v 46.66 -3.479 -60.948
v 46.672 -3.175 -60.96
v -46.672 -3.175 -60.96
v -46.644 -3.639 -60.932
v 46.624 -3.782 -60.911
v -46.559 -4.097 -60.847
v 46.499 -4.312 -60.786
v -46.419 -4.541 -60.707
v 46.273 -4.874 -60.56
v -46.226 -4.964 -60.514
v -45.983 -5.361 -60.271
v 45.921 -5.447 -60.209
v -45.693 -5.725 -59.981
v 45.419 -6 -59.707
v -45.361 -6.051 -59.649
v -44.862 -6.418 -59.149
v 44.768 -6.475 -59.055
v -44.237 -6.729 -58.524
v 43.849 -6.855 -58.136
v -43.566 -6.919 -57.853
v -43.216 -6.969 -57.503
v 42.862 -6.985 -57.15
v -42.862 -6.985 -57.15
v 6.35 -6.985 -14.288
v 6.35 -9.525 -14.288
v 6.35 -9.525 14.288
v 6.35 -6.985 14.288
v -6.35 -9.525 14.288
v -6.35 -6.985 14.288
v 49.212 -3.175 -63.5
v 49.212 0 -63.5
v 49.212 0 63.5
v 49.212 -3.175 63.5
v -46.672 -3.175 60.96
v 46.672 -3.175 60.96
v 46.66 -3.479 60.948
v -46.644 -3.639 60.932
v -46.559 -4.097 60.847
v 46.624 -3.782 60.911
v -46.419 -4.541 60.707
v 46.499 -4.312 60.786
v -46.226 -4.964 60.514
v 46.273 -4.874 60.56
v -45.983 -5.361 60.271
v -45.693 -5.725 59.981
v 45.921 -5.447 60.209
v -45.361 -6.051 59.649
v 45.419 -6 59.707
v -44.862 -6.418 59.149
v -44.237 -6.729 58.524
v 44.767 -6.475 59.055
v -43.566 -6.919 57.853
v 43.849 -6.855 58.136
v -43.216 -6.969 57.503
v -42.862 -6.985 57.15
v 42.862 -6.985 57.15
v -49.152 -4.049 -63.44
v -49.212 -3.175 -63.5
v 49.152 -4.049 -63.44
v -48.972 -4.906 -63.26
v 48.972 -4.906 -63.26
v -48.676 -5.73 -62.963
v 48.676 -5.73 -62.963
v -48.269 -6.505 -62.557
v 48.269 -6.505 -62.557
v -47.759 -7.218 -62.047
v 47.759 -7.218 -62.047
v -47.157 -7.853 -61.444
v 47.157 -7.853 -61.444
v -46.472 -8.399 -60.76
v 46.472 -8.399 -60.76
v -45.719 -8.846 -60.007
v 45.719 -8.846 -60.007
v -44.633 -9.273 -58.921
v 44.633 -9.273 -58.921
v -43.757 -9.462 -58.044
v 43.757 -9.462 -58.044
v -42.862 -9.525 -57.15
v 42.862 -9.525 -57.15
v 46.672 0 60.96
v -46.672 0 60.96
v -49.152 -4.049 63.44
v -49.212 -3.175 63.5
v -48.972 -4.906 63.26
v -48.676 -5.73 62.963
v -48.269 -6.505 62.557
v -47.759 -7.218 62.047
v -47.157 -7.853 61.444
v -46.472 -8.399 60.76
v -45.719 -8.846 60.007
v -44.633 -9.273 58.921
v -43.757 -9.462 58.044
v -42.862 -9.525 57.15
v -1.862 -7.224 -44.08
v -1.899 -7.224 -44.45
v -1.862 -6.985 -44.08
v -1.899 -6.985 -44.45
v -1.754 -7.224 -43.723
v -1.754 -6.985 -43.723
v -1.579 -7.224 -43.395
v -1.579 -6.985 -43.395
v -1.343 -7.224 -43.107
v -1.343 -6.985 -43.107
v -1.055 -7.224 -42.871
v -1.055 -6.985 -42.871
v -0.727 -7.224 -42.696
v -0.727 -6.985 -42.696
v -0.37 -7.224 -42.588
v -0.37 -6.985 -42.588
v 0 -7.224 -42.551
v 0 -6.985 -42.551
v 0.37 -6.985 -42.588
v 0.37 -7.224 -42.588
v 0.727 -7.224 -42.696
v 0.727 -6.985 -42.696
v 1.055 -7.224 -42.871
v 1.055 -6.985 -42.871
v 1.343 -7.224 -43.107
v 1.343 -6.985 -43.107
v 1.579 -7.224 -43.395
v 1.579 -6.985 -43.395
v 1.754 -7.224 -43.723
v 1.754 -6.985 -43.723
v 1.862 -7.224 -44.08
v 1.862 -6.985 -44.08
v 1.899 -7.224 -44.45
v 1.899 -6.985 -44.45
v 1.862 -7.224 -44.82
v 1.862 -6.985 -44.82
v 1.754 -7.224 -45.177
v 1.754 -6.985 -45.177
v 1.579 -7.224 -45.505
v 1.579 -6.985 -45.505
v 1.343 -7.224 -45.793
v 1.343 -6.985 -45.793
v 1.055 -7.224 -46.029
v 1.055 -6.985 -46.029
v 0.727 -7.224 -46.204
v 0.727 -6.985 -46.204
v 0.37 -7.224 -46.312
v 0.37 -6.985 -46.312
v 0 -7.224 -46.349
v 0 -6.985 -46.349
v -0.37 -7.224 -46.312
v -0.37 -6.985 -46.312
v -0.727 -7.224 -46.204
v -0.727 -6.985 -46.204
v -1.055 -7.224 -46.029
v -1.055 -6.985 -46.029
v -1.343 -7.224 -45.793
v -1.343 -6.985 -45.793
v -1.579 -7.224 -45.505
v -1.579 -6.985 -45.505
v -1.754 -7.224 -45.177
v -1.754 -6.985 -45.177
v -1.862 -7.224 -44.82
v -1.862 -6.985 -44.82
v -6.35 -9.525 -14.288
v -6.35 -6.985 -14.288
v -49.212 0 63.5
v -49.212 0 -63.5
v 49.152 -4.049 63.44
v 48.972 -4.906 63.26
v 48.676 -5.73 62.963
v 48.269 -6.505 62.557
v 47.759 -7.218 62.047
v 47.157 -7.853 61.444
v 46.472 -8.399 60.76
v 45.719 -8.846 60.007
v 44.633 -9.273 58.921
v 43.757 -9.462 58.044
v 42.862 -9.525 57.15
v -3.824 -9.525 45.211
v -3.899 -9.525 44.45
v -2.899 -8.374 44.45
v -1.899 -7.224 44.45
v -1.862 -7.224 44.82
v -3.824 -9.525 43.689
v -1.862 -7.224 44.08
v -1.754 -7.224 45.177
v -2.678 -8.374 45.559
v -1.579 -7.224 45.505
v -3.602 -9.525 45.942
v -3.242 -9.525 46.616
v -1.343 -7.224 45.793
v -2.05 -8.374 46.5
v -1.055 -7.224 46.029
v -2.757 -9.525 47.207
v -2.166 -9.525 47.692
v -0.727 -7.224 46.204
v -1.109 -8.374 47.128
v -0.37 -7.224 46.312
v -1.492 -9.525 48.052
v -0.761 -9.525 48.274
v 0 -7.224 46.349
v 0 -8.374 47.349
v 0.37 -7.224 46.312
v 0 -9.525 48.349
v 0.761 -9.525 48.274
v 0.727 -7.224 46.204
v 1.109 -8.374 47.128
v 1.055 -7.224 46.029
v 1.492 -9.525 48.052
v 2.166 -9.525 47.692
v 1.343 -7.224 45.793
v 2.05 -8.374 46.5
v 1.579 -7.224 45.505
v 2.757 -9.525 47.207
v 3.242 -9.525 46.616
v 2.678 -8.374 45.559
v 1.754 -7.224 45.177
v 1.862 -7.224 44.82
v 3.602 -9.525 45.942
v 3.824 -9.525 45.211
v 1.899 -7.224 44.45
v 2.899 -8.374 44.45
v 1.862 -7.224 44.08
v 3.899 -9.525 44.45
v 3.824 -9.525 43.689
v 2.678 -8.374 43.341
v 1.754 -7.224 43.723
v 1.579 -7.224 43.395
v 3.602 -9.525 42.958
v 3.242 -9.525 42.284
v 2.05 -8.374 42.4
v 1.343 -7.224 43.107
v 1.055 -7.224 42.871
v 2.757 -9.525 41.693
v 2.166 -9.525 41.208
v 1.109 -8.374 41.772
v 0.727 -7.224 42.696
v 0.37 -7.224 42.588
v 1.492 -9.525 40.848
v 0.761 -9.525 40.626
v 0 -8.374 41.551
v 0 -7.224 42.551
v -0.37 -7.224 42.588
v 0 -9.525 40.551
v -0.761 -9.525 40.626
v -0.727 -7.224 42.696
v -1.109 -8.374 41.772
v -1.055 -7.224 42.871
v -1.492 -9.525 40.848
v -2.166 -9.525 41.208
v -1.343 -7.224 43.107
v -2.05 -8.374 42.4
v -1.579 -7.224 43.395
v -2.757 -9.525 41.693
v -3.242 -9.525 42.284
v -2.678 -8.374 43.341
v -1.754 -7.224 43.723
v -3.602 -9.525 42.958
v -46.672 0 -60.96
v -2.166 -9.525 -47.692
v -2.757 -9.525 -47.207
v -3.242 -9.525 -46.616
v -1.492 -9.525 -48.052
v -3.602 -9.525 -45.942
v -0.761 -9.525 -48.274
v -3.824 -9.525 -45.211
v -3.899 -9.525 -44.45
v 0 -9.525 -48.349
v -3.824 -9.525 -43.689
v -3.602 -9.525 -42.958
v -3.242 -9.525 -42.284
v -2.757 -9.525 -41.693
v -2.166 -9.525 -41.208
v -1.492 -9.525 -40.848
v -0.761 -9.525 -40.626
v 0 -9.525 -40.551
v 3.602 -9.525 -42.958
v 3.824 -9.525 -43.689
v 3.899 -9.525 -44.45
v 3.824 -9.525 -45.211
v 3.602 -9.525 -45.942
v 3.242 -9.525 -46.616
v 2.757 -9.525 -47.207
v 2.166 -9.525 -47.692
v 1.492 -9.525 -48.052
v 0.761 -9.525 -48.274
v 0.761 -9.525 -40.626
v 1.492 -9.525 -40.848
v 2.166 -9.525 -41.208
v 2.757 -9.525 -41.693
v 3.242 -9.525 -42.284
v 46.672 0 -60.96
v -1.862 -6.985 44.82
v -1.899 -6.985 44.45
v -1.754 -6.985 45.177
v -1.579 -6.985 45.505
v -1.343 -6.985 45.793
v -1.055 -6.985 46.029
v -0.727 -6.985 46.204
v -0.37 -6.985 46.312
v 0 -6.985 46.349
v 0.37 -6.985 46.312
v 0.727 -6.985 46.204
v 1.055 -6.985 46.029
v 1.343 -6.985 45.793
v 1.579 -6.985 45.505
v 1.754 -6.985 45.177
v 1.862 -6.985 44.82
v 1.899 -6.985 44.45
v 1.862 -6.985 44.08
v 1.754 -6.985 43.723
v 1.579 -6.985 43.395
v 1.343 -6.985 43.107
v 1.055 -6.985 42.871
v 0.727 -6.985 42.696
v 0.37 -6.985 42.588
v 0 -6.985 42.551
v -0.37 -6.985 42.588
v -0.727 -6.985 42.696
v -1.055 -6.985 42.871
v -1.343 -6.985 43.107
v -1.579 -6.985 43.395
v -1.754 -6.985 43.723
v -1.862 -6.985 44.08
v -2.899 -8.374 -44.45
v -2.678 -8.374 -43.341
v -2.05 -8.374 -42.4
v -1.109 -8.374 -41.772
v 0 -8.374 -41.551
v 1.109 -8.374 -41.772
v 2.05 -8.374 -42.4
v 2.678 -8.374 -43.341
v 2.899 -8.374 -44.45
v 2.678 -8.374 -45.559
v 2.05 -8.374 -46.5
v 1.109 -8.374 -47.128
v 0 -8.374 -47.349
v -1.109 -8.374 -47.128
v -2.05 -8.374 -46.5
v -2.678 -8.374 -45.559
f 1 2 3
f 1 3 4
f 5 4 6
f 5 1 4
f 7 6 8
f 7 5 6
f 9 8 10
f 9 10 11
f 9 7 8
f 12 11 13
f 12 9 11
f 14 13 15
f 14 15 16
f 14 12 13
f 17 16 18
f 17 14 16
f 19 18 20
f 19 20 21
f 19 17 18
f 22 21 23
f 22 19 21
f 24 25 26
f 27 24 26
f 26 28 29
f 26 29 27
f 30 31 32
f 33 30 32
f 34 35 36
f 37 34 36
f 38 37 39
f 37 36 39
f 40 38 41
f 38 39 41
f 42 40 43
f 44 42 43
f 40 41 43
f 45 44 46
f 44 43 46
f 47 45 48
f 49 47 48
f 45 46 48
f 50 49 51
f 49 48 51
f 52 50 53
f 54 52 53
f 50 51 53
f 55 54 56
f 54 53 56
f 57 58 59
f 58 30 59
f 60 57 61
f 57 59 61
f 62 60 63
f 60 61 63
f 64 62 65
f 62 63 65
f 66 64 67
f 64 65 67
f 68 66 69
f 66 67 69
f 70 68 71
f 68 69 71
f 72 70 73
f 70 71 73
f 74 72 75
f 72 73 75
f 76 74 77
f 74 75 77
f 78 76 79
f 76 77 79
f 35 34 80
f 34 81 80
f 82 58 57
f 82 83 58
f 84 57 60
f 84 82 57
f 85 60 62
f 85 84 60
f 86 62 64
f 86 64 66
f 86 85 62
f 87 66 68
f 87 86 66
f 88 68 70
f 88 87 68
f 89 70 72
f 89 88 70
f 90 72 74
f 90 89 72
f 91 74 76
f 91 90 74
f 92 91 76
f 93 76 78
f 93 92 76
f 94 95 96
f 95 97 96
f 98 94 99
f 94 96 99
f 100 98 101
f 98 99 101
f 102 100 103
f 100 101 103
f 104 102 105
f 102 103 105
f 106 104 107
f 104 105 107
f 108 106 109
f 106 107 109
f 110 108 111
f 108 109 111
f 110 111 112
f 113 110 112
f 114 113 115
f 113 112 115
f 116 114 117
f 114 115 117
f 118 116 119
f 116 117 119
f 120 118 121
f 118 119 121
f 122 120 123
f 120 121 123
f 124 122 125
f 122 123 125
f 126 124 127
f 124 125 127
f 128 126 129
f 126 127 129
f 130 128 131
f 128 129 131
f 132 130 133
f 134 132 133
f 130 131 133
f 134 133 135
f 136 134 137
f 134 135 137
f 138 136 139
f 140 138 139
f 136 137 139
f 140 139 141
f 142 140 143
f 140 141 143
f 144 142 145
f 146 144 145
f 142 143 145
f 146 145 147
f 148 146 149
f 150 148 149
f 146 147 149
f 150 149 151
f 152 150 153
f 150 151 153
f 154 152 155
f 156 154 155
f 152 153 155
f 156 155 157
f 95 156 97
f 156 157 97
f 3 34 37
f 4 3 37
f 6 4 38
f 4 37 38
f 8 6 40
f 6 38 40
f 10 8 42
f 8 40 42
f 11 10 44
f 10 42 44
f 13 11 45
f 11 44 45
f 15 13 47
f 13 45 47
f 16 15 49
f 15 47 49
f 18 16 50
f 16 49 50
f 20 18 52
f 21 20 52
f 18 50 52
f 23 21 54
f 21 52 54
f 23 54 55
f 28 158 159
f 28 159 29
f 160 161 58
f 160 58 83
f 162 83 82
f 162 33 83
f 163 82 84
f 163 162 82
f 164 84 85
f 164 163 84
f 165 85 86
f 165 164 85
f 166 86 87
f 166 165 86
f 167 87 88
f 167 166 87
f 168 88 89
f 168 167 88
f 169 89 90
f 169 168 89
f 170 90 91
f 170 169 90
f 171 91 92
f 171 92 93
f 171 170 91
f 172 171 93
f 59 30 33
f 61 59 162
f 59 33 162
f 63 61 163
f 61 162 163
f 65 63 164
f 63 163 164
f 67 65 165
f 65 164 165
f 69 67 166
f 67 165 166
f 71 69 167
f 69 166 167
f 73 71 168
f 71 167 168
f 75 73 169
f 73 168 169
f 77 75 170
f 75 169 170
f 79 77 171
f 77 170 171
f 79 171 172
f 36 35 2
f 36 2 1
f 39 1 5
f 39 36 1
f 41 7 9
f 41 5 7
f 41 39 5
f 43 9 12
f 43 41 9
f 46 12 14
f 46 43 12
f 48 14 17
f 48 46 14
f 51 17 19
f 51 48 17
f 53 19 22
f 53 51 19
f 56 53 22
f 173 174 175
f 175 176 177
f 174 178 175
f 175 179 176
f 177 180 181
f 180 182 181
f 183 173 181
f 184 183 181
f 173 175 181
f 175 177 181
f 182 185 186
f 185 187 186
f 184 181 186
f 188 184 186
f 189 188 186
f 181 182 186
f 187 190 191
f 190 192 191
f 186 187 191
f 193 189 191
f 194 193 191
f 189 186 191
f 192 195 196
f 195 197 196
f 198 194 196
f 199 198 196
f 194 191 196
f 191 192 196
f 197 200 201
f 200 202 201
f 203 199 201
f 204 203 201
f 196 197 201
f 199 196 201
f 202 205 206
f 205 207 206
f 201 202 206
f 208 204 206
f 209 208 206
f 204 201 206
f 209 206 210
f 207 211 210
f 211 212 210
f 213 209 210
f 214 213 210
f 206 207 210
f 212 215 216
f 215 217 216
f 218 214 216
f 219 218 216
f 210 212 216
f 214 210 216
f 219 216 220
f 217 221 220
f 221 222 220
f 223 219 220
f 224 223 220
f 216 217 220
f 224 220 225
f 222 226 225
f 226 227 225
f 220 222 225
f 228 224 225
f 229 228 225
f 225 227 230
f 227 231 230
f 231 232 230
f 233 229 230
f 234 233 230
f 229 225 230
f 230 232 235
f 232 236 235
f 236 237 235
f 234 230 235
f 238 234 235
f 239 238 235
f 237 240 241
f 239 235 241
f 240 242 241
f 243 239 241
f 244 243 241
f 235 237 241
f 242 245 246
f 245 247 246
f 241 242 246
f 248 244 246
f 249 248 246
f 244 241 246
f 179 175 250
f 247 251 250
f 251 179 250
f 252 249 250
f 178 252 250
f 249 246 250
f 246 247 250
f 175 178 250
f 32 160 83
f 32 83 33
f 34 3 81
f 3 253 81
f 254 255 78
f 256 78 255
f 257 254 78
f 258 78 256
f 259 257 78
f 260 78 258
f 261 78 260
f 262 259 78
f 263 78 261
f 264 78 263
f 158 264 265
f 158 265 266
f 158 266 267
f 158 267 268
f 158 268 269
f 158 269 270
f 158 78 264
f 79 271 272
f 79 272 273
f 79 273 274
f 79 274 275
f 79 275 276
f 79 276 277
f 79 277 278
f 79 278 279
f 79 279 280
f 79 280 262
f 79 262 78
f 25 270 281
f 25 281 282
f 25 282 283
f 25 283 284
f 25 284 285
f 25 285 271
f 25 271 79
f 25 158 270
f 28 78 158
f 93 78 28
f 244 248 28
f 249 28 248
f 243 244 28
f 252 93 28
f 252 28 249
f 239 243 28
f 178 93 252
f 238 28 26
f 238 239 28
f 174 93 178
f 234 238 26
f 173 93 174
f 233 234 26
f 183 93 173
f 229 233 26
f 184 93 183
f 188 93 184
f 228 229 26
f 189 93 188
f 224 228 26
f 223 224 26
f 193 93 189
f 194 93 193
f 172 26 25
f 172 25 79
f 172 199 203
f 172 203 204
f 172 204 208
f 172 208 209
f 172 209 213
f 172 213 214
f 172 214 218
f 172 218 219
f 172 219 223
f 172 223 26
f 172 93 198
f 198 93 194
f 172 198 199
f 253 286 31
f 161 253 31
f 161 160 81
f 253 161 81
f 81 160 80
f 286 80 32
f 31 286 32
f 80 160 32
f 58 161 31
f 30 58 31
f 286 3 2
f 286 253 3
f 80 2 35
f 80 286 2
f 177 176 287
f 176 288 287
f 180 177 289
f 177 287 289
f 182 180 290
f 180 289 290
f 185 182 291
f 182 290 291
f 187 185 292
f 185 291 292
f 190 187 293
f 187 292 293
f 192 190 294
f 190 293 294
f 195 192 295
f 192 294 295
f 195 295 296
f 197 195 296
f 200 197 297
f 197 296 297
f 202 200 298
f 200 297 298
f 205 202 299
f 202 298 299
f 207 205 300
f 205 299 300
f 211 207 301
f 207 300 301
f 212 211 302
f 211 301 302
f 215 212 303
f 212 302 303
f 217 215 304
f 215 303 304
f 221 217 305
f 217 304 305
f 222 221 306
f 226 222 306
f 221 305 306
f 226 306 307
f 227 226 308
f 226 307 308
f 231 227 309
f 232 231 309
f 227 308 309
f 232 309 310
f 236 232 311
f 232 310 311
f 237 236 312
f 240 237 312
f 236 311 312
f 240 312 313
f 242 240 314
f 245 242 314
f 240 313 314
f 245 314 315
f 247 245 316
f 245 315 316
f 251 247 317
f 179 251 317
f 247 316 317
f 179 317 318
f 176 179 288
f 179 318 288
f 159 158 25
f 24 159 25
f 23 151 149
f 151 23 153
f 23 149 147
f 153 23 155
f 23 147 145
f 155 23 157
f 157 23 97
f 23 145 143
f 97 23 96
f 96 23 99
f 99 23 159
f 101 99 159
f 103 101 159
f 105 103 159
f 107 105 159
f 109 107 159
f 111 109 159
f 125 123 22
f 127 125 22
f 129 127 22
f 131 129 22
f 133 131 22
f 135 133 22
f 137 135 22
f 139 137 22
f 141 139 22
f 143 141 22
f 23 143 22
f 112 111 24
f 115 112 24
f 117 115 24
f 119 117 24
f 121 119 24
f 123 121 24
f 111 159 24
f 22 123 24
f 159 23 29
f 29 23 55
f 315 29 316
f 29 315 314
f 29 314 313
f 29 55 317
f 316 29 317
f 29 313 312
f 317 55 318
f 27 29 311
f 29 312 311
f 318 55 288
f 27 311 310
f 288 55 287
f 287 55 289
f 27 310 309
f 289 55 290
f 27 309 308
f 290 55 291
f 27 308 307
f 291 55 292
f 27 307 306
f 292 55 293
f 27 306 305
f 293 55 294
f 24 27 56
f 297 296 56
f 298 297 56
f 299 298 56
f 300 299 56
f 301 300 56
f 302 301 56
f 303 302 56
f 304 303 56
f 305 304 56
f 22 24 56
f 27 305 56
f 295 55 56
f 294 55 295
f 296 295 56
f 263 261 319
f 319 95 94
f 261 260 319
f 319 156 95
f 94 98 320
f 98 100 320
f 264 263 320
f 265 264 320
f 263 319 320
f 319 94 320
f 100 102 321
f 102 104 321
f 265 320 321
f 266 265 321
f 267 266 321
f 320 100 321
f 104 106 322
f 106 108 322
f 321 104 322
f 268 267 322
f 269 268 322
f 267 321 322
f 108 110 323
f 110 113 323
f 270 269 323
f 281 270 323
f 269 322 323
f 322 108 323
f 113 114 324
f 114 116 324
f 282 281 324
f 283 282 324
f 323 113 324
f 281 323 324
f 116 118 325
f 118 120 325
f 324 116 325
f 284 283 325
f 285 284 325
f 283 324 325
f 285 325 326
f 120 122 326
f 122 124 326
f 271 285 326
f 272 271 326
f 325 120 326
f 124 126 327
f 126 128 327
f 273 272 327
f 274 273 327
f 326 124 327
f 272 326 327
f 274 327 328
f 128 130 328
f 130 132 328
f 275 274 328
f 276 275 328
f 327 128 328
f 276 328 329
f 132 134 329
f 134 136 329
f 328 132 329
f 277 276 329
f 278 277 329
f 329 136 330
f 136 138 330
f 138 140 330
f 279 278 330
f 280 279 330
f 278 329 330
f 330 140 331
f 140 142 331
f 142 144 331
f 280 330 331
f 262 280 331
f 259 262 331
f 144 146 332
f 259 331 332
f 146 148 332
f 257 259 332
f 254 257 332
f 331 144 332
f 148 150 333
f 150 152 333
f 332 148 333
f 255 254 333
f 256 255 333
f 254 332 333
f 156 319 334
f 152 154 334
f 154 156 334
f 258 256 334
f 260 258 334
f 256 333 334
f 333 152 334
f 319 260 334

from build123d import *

# Parameters (mm, degrees)
F0_W           = 98.425
F0_H           = 127
F1_DEPTH       = 9.525
F2_R           = 6.35
F3_T           = -2.54
F4_W           = 12.7
F4_H           = 28.575
F5_DEPTH       = 9.526
F6_D           = 3.7973
F6_DEPTH       = 12.7
F6_CSINK_D     = 7.7978
F6_CSINK_ANGLE = 82
F6_TIP         = 1.1408240143


with BuildPart() as f1:
    # F0 (on Front) → F1 (new body)
    with BuildSketch(Plane.XZ):
        Rectangle(F0_W, F0_H)
    extrude(amount=F1_DEPTH)

    # F2
    f2_edges = [f1.edges().sort_by_distance(p)[0] for p in [
        (49.2125, -9.525, 0),
        (0, -9.525, 63.5),
        (-49.2125, -9.525, 0),
        (0, -9.525, -63.5),
    ]]
    fillet(f2_edges, radius=F2_R)

    # F3
    f3_openings = [f1.faces().sort_by_distance(p)[0] for p in [
        (0, 0, 0),
    ]]
    offset(amount=F3_T, openings=f3_openings)

    # F4 (on face) → F5 (cut, through all)
    with BuildSketch(Plane.XZ.offset(9.525)):
        Rectangle(F4_W, F4_H)
    extrude(amount=-F5_DEPTH, mode=Mode.SUBTRACT)

    # F6
    with Locations(Plane.XZ.offset(9.525)):
        with Locations((0, 44.45), (0, -44.45)):
            CounterSinkHole(F6_D / 2, F6_CSINK_D / 2, depth=F6_DEPTH, counter_sink_angle=F6_CSINK_ANGLE)
            with Locations((0, 0, -(F6_DEPTH + F6_TIP / 2))):  # 118° drill point
                Cone(0, F6_D / 2, F6_TIP, mode=Mode.SUBTRACT)


solid = f1.part
